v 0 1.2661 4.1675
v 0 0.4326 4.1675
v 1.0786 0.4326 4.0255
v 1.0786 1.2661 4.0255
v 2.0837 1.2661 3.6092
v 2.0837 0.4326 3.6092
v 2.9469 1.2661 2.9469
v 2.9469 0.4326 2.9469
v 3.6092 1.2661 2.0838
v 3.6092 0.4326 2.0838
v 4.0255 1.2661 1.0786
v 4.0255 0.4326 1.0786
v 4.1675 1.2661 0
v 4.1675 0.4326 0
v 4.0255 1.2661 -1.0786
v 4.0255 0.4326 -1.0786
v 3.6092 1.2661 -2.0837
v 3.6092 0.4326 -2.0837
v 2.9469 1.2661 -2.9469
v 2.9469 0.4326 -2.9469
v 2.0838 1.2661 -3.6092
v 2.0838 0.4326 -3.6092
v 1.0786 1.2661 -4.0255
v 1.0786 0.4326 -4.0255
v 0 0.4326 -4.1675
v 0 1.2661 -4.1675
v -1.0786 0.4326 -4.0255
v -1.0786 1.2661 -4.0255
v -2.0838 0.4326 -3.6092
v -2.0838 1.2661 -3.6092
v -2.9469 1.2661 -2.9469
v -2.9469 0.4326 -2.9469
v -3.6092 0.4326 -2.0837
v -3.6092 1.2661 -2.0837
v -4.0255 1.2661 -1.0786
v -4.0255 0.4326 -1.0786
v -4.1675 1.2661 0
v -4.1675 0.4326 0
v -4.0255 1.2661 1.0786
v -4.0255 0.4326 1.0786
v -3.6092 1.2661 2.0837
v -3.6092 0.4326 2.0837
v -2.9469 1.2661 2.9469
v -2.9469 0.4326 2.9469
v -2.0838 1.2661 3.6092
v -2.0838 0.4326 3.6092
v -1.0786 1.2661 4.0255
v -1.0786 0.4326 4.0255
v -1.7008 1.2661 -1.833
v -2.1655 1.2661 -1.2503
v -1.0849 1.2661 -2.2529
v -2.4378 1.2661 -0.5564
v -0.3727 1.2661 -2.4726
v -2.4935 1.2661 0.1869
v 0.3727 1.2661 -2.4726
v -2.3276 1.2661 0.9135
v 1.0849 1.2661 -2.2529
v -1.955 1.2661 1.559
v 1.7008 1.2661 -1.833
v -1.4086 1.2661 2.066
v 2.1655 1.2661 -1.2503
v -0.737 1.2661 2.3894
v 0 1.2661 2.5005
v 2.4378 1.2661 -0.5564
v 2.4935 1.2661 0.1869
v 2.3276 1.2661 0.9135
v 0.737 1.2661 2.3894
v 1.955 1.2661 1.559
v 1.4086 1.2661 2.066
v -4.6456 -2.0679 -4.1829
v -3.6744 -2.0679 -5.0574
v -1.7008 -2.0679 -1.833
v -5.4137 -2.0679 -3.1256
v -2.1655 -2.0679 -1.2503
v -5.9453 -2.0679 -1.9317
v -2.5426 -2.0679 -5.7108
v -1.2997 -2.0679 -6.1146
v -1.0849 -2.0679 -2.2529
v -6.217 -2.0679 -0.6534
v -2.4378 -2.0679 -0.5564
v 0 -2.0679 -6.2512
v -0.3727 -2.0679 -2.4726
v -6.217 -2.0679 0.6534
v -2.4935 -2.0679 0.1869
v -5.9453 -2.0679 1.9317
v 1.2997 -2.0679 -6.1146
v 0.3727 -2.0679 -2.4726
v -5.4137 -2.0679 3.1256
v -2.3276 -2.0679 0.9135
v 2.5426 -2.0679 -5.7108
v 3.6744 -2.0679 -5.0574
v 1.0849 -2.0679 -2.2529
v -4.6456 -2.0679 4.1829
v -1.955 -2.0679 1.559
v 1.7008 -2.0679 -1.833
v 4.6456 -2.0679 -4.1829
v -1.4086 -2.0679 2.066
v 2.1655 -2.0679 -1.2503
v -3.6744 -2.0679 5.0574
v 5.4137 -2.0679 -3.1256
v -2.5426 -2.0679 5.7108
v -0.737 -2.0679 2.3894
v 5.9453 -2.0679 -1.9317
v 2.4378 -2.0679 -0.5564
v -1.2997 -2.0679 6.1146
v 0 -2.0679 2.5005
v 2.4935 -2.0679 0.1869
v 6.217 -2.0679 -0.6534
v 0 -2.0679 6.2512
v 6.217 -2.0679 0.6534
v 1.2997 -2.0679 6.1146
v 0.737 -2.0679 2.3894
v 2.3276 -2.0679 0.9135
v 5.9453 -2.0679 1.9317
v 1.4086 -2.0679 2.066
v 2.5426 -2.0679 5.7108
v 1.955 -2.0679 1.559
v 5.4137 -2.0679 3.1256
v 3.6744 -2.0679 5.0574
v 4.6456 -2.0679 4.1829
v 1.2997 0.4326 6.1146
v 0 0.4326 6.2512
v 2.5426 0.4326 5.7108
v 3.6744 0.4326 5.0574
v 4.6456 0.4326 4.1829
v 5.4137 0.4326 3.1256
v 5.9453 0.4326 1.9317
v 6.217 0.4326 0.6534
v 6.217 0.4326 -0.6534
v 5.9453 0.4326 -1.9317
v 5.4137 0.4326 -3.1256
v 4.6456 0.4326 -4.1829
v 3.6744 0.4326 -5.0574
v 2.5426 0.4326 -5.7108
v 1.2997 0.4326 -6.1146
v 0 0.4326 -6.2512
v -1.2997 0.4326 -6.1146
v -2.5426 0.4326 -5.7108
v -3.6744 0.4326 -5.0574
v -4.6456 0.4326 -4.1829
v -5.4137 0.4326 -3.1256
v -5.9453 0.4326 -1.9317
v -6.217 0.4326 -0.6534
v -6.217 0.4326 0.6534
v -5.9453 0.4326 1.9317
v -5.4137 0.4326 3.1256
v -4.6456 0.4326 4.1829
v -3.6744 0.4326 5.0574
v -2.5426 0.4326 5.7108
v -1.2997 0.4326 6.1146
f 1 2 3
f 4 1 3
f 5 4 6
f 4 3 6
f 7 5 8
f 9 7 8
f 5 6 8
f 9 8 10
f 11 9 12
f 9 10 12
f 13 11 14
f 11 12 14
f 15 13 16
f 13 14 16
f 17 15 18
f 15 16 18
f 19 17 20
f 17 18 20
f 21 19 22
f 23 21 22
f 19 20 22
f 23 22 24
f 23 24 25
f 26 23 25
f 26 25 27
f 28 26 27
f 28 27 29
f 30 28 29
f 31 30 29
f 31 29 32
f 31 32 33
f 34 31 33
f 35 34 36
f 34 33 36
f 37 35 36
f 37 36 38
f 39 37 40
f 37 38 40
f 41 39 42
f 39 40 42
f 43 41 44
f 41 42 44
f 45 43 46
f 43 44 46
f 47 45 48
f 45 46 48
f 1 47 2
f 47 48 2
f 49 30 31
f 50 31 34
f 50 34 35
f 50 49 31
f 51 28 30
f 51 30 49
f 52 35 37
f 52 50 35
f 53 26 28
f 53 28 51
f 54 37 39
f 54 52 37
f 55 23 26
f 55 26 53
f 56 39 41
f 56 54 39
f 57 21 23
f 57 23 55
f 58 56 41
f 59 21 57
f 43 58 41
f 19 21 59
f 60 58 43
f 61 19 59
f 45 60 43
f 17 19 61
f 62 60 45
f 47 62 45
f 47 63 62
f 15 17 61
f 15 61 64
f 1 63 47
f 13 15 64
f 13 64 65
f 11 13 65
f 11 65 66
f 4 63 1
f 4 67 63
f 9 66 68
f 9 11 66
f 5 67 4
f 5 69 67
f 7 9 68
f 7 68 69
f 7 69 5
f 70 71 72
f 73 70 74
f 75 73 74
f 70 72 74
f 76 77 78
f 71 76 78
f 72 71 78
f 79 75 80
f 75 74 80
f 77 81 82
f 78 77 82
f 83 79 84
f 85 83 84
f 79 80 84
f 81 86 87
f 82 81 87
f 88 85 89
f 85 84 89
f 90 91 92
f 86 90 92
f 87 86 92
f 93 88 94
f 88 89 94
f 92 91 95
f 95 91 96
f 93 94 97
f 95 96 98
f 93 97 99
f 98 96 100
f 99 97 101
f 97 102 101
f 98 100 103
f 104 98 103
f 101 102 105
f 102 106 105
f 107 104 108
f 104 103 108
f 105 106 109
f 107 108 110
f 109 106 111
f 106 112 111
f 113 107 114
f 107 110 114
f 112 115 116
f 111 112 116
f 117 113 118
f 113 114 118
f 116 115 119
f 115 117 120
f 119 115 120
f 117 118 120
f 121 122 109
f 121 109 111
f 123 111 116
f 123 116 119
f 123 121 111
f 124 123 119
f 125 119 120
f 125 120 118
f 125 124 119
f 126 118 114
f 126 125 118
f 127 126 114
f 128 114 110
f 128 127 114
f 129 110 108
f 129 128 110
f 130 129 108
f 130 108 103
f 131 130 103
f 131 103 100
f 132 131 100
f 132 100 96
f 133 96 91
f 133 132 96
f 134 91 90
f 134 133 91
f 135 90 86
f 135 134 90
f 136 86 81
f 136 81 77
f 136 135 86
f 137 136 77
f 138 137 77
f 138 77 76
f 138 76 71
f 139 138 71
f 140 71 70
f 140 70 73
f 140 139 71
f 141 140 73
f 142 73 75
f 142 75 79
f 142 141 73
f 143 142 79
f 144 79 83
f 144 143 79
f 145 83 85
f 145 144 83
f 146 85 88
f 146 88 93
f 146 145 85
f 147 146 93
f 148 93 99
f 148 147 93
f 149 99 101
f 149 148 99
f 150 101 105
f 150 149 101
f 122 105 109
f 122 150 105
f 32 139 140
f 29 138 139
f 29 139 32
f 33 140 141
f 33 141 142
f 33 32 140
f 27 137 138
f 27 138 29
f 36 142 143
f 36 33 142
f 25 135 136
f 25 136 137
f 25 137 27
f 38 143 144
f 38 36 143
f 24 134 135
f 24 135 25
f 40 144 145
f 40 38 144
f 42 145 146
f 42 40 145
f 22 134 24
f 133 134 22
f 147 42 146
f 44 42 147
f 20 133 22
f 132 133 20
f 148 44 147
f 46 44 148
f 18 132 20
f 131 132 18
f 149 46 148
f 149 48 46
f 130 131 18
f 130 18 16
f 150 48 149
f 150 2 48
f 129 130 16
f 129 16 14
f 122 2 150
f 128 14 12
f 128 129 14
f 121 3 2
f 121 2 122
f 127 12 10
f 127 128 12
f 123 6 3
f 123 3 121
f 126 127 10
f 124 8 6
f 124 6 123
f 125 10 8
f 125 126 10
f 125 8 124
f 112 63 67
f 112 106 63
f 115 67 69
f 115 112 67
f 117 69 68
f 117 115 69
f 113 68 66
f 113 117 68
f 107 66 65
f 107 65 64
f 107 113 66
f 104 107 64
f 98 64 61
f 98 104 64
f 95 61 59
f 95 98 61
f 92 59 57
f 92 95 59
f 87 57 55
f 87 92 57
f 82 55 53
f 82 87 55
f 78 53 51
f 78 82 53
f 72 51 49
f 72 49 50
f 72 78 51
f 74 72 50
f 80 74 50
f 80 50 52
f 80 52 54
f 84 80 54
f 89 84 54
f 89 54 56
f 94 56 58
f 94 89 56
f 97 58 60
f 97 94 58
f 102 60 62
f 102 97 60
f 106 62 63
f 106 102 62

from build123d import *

# Parameters (mm, degrees)
SKETCH1_R           = 3.75
SKETCH1_R_2         = 1.5
BOSS_EXTRUDE1_DEPTH = 1.5
BOSS_EXTRUDE2_START = 0.5
SKETCH1_3_R         = 2.5
SKETCH1_3_R_2       = 1.5
BOSS_EXTRUDE2_DEPTH = 0.5
SCALE1_SCALE        = 1.667


with BuildPart() as part:
    # Sketch1 → Boss-Extrude1 (new body)
    with BuildSketch(Plane(origin=(0, 0, 0), x_dir=(1, 0, 0), z_dir=(0, 1, 0))):
        Circle(SKETCH1_R)
        Circle(SKETCH1_R_2, mode=Mode.SUBTRACT)
    extrude(amount=-BOSS_EXTRUDE1_DEPTH)

    # Sketch1<3> → Boss-Extrude2 (add)
    with BuildSketch(Plane(origin=(0, 0, 0), x_dir=(1, 0, 0), z_dir=(0, 1, 0)).offset(BOSS_EXTRUDE2_START)):
        Circle(SKETCH1_3_R)
        Circle(SKETCH1_3_R_2, mode=Mode.SUBTRACT)
    extrude(amount=-BOSS_EXTRUDE2_DEPTH)


with BuildPart() as part_1:
    # Scale1: scaled about (0, -0.648573693, 0)
    add(part.part.scale(SCALE1_SCALE).moved(Location((0, 0.432598653, 0))))


solid = part_1.part
